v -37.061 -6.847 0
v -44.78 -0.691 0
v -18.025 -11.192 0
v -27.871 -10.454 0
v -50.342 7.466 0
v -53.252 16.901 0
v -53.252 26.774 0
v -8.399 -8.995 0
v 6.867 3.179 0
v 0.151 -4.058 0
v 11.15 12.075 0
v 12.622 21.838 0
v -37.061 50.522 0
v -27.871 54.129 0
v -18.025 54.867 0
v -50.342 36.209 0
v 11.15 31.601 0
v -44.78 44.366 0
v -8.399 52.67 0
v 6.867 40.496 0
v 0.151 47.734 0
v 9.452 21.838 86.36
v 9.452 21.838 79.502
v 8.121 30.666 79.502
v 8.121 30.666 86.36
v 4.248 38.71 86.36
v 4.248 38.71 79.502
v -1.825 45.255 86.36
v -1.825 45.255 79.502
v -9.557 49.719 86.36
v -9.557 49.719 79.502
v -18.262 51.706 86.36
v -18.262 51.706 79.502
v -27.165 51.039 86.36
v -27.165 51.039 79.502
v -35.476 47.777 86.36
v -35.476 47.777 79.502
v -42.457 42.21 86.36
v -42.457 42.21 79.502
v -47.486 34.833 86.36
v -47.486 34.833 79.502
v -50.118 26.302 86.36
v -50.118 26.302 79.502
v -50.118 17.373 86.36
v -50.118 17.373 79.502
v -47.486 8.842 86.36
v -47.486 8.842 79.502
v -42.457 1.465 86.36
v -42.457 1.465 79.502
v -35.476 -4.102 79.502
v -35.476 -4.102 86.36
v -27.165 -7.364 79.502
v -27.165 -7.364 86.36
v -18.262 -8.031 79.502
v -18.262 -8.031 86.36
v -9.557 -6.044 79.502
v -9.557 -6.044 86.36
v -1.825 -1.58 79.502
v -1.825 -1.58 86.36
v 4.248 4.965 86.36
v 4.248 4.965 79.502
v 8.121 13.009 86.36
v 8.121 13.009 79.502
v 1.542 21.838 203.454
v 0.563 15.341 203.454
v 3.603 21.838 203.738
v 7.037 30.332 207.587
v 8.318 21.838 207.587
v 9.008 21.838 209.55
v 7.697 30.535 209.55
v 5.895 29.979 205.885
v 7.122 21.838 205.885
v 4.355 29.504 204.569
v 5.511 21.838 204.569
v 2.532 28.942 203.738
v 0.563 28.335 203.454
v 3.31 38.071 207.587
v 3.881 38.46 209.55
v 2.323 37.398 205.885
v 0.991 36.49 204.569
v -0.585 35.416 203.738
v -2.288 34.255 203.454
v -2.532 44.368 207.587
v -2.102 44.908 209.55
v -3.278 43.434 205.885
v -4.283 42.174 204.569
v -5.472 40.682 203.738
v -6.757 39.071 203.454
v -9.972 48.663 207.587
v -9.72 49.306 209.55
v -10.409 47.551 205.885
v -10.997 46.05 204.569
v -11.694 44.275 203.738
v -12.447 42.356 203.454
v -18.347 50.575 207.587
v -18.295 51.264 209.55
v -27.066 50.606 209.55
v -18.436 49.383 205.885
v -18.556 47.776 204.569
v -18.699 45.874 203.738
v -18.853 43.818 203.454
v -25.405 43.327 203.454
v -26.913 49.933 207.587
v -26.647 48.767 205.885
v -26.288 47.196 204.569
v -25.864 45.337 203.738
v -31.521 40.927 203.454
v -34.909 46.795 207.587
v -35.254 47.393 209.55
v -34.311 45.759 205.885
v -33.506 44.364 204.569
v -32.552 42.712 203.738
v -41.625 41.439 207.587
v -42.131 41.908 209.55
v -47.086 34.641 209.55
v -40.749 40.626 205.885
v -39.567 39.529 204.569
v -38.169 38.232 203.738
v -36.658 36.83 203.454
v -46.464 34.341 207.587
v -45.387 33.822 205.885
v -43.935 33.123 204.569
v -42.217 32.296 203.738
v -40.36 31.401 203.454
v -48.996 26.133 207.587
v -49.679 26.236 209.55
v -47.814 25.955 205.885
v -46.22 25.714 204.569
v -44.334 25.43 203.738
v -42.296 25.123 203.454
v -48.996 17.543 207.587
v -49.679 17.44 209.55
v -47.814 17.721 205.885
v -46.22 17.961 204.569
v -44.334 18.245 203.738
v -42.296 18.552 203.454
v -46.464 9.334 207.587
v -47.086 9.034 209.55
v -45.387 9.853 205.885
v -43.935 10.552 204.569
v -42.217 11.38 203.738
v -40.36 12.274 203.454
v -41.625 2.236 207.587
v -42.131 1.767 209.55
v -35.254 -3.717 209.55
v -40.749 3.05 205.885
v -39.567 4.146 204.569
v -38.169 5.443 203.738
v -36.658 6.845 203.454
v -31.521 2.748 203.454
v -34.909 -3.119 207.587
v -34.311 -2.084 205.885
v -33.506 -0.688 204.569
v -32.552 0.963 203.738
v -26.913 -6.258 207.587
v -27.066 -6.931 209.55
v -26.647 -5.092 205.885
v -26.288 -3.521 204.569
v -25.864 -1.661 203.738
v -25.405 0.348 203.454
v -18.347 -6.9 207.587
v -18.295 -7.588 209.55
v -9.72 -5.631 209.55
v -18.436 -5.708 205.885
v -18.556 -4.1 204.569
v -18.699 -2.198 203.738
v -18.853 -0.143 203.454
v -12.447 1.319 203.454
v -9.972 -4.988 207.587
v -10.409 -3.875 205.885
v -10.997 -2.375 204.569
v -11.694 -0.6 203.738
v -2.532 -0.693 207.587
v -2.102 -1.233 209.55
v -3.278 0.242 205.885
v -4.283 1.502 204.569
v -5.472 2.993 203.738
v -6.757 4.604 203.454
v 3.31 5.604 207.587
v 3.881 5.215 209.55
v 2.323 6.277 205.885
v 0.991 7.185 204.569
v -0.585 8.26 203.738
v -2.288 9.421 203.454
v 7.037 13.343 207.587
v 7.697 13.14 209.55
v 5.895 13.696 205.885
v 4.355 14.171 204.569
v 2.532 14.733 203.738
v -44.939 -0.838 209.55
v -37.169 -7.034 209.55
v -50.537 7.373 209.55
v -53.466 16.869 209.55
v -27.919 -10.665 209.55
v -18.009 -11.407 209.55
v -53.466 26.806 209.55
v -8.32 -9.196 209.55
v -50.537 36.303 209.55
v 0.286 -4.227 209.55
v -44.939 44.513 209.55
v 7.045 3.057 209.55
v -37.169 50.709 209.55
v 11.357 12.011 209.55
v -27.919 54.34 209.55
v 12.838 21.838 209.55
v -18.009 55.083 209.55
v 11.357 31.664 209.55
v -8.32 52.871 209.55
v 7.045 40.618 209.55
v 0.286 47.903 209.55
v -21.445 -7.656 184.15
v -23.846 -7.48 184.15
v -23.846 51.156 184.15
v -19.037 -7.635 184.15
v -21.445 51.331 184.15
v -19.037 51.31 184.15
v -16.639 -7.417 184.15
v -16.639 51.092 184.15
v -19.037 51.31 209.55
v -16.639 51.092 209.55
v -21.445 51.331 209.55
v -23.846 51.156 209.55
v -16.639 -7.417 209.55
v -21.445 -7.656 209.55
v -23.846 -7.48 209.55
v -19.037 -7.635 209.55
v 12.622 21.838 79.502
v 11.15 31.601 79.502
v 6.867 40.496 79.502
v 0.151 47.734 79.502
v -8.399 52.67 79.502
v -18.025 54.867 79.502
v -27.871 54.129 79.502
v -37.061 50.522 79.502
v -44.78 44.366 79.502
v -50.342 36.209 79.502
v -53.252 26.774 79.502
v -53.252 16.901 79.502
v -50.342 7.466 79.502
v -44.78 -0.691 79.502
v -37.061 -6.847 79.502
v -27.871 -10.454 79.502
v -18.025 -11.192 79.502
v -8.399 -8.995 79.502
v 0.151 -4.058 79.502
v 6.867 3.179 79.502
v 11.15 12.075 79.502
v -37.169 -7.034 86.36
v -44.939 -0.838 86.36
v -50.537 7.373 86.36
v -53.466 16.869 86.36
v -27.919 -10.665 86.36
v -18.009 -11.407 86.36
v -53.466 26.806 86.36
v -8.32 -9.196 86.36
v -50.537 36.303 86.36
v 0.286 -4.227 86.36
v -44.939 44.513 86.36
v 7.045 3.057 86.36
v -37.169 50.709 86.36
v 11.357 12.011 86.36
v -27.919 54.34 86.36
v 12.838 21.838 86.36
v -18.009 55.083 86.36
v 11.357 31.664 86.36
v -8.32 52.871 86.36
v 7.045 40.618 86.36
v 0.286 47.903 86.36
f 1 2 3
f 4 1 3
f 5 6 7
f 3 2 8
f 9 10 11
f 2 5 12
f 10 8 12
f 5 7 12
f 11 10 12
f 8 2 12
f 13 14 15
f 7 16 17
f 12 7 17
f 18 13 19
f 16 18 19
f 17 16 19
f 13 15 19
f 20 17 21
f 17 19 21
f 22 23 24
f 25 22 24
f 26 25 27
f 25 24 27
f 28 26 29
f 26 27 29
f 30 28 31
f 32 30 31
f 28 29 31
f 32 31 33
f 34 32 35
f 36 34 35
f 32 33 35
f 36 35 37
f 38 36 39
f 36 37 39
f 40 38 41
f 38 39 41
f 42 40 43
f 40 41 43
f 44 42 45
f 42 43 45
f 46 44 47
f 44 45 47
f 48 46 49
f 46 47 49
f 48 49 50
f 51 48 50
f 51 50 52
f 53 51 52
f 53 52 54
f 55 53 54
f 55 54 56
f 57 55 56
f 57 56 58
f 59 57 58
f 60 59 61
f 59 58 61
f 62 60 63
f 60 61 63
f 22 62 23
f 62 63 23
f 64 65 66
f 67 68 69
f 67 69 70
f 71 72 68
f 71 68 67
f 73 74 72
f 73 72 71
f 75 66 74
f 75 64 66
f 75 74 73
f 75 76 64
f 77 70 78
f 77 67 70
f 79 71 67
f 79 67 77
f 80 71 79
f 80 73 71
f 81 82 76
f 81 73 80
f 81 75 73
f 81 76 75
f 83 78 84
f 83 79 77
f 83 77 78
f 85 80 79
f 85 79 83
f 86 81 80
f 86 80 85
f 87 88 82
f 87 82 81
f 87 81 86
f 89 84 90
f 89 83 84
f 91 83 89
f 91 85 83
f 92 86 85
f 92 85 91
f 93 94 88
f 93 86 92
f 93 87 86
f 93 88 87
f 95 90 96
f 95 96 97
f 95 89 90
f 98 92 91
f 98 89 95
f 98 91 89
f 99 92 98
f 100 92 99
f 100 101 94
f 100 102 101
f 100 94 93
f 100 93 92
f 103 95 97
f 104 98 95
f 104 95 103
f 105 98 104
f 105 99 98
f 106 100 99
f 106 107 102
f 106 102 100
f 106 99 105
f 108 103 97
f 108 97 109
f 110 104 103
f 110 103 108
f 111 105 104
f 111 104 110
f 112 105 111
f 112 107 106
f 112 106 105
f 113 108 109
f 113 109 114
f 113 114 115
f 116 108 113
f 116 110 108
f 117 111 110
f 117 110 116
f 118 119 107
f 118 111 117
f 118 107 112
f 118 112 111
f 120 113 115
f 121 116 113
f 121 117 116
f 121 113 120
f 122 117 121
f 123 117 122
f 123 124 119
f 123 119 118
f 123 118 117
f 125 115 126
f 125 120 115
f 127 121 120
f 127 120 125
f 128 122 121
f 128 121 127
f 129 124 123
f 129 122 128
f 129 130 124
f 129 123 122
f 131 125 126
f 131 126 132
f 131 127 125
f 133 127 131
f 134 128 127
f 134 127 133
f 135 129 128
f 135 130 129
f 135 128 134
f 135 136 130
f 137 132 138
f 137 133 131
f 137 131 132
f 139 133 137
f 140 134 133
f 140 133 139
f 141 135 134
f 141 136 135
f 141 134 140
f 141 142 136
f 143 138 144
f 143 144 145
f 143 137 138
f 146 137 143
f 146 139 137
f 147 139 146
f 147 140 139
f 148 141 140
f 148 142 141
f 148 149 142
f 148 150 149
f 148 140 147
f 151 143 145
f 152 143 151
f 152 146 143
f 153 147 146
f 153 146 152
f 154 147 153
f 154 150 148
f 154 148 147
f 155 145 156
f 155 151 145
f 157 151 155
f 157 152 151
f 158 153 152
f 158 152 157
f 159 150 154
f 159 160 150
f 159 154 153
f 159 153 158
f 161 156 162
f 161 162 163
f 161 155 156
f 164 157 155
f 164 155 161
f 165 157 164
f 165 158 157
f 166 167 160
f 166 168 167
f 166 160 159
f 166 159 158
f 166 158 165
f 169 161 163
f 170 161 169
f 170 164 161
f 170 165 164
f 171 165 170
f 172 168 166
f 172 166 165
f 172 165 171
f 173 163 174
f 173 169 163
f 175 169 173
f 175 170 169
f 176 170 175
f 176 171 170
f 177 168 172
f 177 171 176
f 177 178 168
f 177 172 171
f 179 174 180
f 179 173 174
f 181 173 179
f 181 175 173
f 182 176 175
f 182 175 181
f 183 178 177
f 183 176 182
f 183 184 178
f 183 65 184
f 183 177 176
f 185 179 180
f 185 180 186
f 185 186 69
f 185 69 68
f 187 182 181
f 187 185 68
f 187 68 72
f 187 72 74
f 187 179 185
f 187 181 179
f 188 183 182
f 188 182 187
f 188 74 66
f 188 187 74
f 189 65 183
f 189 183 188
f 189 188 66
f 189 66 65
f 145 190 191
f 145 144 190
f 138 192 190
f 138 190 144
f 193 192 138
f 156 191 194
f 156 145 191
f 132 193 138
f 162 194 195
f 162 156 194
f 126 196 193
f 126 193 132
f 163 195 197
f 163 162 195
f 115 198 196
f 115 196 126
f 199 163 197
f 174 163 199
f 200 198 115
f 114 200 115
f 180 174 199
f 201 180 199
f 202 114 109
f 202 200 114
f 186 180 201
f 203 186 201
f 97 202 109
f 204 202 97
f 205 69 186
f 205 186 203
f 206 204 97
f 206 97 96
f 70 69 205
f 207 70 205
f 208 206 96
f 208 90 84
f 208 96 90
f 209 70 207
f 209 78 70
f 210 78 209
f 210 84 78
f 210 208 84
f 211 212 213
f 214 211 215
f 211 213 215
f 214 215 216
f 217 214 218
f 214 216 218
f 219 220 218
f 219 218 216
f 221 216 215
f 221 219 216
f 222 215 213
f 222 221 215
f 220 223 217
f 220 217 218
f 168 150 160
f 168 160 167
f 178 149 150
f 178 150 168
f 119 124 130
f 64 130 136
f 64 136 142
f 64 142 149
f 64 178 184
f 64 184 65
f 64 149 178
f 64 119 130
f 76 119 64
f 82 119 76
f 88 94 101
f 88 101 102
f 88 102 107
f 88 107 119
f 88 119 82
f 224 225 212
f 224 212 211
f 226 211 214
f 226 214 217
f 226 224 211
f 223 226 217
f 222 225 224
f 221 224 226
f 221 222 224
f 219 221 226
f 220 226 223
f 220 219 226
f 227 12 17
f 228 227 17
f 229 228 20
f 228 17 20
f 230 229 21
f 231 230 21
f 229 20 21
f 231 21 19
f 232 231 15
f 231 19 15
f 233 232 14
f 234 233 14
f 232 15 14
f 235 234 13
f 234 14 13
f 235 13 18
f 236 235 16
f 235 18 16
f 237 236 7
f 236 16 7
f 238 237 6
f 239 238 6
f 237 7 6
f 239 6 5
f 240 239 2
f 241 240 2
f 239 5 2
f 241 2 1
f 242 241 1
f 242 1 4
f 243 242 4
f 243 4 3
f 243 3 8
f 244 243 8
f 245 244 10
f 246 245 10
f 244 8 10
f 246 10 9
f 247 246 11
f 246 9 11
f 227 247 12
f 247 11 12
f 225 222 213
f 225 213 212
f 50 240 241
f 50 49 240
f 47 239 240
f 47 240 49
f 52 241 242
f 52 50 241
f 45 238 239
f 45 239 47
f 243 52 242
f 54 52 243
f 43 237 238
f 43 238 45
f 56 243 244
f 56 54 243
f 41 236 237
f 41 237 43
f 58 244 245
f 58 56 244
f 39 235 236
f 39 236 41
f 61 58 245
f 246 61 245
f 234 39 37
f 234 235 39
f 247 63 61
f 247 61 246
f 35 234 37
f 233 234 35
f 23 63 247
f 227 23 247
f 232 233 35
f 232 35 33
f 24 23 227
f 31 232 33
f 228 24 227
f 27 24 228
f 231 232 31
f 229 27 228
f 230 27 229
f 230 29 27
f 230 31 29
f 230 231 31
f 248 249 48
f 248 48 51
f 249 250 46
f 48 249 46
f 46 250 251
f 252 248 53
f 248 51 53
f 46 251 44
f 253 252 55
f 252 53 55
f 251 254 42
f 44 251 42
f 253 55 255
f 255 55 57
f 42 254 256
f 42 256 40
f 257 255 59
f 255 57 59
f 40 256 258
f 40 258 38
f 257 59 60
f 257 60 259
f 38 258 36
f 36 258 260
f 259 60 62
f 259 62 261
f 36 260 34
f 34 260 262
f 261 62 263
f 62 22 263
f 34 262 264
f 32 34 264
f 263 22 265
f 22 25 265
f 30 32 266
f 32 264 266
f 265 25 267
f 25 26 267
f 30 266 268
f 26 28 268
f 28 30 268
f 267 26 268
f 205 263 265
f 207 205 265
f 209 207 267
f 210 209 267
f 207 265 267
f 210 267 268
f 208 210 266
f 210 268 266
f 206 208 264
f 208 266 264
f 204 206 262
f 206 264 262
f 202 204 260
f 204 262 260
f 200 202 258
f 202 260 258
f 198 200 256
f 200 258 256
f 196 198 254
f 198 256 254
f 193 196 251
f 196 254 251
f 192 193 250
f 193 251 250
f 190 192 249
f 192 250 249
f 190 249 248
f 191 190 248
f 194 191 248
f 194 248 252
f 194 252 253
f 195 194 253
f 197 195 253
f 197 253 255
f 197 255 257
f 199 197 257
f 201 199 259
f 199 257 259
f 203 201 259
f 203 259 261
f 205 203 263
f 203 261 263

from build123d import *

# Parameters (mm, degrees)
F0_R      = 33.1221613945
F1_DEPTH  = 79.502
F2_R      = 29.9522541519
F3_DEPTH  = 6.858
F4_R      = 33.3382653076
F4_R_2    = 29.9522541519
F5_DEPTH  = 123.19
F6_R      = 29.5084253816
F7_DEPTH  = 6.096
F10_DEPTH = 25.4


# Not quite as in the source:
# - a fillet or chamfer that OpenCascade refuses, or shapes differently, is made with other operations: its cross-section is extruded or revolved along the edge and cut away or added


with BuildPart() as f1:
    # F0 (on Top) → F1 (new body)
    with BuildSketch(Plane.XY):
        with Locations((-20.5001533031, 21.8376107514)):
            Circle(F0_R)
    extrude(amount=F1_DEPTH)

    # F2 (on face) → F3 (join)
    with BuildSketch(Plane.XY.offset(79.502)):
        with Locations((-20.5001533031, 21.8376107514)):
            Circle(F2_R)
    extrude(amount=F3_DEPTH)

    # F4 (on face) → F5 (join)
    with BuildSketch(Plane.XY.offset(86.36)):
        with Locations((-20.5001533031, 21.8376107514)):
            Circle(F4_R)
        with Locations((-20.5001533031, 21.8376107514)):
            Circle(F4_R_2, mode=Mode.SUBTRACT)
        with Locations((-20.5001533031, 21.8376107514)):
            Circle(F4_R_2)
    extrude(amount=F5_DEPTH)

    # F6 (on face) → F7 (cut)
    with BuildSketch(Plane.XY.offset(209.55)):
        with Locations((-20.5001533031, 21.8376107514)):
            Circle(F6_R)
    extrude(amount=-F7_DEPTH, mode=Mode.SUBTRACT)

    # F8: fillet of radius 7.62 on 1 edges, made by hand

    # F8_s1 → F8_t2 (revolve)
    with BuildSketch(Plane.XZ.offset(-21.8376107514)):
        with BuildLine():
            ThreePointArc((9.0082720785, 209.55), (6.3615384966, 205.1715733804), (1.5422273425, 203.454))
            Line((1.5422273425, 203.454), (9.0082720785, 203.454))
            Line((9.0082720785, 203.454), (9.0082720785, 209.55))
        make_face()
    revolve(axis=Axis((-20.5001533031, 21.8376107514, 203.454), (0, 0, 1)))


with BuildPart() as f10:
    # F9 (on face) → F10 (new body)
    with BuildSketch(Plane.XY.offset(209.55)):
        with BuildLine():
            ThreePointArc((-16.6392866522, 51.0923689491), (-20.2408198189, 51.3448965406), (-23.8462351263, 51.1557093415))
            Line((-23.8462351263, 51.1557093415), (-23.8462351263, -7.4804878387))
            ThreePointArc((-23.8462351263, -7.4804878387), (-20.2408198189, -7.6696750378), (-16.6392866522, -7.4171474463))
            Line((-16.6392866522, -7.4171474463), (-16.6392866522, 51.0923689491))
        make_face()
    extrude(amount=-F10_DEPTH)


solid = Compound([f1.part, f10.part])
